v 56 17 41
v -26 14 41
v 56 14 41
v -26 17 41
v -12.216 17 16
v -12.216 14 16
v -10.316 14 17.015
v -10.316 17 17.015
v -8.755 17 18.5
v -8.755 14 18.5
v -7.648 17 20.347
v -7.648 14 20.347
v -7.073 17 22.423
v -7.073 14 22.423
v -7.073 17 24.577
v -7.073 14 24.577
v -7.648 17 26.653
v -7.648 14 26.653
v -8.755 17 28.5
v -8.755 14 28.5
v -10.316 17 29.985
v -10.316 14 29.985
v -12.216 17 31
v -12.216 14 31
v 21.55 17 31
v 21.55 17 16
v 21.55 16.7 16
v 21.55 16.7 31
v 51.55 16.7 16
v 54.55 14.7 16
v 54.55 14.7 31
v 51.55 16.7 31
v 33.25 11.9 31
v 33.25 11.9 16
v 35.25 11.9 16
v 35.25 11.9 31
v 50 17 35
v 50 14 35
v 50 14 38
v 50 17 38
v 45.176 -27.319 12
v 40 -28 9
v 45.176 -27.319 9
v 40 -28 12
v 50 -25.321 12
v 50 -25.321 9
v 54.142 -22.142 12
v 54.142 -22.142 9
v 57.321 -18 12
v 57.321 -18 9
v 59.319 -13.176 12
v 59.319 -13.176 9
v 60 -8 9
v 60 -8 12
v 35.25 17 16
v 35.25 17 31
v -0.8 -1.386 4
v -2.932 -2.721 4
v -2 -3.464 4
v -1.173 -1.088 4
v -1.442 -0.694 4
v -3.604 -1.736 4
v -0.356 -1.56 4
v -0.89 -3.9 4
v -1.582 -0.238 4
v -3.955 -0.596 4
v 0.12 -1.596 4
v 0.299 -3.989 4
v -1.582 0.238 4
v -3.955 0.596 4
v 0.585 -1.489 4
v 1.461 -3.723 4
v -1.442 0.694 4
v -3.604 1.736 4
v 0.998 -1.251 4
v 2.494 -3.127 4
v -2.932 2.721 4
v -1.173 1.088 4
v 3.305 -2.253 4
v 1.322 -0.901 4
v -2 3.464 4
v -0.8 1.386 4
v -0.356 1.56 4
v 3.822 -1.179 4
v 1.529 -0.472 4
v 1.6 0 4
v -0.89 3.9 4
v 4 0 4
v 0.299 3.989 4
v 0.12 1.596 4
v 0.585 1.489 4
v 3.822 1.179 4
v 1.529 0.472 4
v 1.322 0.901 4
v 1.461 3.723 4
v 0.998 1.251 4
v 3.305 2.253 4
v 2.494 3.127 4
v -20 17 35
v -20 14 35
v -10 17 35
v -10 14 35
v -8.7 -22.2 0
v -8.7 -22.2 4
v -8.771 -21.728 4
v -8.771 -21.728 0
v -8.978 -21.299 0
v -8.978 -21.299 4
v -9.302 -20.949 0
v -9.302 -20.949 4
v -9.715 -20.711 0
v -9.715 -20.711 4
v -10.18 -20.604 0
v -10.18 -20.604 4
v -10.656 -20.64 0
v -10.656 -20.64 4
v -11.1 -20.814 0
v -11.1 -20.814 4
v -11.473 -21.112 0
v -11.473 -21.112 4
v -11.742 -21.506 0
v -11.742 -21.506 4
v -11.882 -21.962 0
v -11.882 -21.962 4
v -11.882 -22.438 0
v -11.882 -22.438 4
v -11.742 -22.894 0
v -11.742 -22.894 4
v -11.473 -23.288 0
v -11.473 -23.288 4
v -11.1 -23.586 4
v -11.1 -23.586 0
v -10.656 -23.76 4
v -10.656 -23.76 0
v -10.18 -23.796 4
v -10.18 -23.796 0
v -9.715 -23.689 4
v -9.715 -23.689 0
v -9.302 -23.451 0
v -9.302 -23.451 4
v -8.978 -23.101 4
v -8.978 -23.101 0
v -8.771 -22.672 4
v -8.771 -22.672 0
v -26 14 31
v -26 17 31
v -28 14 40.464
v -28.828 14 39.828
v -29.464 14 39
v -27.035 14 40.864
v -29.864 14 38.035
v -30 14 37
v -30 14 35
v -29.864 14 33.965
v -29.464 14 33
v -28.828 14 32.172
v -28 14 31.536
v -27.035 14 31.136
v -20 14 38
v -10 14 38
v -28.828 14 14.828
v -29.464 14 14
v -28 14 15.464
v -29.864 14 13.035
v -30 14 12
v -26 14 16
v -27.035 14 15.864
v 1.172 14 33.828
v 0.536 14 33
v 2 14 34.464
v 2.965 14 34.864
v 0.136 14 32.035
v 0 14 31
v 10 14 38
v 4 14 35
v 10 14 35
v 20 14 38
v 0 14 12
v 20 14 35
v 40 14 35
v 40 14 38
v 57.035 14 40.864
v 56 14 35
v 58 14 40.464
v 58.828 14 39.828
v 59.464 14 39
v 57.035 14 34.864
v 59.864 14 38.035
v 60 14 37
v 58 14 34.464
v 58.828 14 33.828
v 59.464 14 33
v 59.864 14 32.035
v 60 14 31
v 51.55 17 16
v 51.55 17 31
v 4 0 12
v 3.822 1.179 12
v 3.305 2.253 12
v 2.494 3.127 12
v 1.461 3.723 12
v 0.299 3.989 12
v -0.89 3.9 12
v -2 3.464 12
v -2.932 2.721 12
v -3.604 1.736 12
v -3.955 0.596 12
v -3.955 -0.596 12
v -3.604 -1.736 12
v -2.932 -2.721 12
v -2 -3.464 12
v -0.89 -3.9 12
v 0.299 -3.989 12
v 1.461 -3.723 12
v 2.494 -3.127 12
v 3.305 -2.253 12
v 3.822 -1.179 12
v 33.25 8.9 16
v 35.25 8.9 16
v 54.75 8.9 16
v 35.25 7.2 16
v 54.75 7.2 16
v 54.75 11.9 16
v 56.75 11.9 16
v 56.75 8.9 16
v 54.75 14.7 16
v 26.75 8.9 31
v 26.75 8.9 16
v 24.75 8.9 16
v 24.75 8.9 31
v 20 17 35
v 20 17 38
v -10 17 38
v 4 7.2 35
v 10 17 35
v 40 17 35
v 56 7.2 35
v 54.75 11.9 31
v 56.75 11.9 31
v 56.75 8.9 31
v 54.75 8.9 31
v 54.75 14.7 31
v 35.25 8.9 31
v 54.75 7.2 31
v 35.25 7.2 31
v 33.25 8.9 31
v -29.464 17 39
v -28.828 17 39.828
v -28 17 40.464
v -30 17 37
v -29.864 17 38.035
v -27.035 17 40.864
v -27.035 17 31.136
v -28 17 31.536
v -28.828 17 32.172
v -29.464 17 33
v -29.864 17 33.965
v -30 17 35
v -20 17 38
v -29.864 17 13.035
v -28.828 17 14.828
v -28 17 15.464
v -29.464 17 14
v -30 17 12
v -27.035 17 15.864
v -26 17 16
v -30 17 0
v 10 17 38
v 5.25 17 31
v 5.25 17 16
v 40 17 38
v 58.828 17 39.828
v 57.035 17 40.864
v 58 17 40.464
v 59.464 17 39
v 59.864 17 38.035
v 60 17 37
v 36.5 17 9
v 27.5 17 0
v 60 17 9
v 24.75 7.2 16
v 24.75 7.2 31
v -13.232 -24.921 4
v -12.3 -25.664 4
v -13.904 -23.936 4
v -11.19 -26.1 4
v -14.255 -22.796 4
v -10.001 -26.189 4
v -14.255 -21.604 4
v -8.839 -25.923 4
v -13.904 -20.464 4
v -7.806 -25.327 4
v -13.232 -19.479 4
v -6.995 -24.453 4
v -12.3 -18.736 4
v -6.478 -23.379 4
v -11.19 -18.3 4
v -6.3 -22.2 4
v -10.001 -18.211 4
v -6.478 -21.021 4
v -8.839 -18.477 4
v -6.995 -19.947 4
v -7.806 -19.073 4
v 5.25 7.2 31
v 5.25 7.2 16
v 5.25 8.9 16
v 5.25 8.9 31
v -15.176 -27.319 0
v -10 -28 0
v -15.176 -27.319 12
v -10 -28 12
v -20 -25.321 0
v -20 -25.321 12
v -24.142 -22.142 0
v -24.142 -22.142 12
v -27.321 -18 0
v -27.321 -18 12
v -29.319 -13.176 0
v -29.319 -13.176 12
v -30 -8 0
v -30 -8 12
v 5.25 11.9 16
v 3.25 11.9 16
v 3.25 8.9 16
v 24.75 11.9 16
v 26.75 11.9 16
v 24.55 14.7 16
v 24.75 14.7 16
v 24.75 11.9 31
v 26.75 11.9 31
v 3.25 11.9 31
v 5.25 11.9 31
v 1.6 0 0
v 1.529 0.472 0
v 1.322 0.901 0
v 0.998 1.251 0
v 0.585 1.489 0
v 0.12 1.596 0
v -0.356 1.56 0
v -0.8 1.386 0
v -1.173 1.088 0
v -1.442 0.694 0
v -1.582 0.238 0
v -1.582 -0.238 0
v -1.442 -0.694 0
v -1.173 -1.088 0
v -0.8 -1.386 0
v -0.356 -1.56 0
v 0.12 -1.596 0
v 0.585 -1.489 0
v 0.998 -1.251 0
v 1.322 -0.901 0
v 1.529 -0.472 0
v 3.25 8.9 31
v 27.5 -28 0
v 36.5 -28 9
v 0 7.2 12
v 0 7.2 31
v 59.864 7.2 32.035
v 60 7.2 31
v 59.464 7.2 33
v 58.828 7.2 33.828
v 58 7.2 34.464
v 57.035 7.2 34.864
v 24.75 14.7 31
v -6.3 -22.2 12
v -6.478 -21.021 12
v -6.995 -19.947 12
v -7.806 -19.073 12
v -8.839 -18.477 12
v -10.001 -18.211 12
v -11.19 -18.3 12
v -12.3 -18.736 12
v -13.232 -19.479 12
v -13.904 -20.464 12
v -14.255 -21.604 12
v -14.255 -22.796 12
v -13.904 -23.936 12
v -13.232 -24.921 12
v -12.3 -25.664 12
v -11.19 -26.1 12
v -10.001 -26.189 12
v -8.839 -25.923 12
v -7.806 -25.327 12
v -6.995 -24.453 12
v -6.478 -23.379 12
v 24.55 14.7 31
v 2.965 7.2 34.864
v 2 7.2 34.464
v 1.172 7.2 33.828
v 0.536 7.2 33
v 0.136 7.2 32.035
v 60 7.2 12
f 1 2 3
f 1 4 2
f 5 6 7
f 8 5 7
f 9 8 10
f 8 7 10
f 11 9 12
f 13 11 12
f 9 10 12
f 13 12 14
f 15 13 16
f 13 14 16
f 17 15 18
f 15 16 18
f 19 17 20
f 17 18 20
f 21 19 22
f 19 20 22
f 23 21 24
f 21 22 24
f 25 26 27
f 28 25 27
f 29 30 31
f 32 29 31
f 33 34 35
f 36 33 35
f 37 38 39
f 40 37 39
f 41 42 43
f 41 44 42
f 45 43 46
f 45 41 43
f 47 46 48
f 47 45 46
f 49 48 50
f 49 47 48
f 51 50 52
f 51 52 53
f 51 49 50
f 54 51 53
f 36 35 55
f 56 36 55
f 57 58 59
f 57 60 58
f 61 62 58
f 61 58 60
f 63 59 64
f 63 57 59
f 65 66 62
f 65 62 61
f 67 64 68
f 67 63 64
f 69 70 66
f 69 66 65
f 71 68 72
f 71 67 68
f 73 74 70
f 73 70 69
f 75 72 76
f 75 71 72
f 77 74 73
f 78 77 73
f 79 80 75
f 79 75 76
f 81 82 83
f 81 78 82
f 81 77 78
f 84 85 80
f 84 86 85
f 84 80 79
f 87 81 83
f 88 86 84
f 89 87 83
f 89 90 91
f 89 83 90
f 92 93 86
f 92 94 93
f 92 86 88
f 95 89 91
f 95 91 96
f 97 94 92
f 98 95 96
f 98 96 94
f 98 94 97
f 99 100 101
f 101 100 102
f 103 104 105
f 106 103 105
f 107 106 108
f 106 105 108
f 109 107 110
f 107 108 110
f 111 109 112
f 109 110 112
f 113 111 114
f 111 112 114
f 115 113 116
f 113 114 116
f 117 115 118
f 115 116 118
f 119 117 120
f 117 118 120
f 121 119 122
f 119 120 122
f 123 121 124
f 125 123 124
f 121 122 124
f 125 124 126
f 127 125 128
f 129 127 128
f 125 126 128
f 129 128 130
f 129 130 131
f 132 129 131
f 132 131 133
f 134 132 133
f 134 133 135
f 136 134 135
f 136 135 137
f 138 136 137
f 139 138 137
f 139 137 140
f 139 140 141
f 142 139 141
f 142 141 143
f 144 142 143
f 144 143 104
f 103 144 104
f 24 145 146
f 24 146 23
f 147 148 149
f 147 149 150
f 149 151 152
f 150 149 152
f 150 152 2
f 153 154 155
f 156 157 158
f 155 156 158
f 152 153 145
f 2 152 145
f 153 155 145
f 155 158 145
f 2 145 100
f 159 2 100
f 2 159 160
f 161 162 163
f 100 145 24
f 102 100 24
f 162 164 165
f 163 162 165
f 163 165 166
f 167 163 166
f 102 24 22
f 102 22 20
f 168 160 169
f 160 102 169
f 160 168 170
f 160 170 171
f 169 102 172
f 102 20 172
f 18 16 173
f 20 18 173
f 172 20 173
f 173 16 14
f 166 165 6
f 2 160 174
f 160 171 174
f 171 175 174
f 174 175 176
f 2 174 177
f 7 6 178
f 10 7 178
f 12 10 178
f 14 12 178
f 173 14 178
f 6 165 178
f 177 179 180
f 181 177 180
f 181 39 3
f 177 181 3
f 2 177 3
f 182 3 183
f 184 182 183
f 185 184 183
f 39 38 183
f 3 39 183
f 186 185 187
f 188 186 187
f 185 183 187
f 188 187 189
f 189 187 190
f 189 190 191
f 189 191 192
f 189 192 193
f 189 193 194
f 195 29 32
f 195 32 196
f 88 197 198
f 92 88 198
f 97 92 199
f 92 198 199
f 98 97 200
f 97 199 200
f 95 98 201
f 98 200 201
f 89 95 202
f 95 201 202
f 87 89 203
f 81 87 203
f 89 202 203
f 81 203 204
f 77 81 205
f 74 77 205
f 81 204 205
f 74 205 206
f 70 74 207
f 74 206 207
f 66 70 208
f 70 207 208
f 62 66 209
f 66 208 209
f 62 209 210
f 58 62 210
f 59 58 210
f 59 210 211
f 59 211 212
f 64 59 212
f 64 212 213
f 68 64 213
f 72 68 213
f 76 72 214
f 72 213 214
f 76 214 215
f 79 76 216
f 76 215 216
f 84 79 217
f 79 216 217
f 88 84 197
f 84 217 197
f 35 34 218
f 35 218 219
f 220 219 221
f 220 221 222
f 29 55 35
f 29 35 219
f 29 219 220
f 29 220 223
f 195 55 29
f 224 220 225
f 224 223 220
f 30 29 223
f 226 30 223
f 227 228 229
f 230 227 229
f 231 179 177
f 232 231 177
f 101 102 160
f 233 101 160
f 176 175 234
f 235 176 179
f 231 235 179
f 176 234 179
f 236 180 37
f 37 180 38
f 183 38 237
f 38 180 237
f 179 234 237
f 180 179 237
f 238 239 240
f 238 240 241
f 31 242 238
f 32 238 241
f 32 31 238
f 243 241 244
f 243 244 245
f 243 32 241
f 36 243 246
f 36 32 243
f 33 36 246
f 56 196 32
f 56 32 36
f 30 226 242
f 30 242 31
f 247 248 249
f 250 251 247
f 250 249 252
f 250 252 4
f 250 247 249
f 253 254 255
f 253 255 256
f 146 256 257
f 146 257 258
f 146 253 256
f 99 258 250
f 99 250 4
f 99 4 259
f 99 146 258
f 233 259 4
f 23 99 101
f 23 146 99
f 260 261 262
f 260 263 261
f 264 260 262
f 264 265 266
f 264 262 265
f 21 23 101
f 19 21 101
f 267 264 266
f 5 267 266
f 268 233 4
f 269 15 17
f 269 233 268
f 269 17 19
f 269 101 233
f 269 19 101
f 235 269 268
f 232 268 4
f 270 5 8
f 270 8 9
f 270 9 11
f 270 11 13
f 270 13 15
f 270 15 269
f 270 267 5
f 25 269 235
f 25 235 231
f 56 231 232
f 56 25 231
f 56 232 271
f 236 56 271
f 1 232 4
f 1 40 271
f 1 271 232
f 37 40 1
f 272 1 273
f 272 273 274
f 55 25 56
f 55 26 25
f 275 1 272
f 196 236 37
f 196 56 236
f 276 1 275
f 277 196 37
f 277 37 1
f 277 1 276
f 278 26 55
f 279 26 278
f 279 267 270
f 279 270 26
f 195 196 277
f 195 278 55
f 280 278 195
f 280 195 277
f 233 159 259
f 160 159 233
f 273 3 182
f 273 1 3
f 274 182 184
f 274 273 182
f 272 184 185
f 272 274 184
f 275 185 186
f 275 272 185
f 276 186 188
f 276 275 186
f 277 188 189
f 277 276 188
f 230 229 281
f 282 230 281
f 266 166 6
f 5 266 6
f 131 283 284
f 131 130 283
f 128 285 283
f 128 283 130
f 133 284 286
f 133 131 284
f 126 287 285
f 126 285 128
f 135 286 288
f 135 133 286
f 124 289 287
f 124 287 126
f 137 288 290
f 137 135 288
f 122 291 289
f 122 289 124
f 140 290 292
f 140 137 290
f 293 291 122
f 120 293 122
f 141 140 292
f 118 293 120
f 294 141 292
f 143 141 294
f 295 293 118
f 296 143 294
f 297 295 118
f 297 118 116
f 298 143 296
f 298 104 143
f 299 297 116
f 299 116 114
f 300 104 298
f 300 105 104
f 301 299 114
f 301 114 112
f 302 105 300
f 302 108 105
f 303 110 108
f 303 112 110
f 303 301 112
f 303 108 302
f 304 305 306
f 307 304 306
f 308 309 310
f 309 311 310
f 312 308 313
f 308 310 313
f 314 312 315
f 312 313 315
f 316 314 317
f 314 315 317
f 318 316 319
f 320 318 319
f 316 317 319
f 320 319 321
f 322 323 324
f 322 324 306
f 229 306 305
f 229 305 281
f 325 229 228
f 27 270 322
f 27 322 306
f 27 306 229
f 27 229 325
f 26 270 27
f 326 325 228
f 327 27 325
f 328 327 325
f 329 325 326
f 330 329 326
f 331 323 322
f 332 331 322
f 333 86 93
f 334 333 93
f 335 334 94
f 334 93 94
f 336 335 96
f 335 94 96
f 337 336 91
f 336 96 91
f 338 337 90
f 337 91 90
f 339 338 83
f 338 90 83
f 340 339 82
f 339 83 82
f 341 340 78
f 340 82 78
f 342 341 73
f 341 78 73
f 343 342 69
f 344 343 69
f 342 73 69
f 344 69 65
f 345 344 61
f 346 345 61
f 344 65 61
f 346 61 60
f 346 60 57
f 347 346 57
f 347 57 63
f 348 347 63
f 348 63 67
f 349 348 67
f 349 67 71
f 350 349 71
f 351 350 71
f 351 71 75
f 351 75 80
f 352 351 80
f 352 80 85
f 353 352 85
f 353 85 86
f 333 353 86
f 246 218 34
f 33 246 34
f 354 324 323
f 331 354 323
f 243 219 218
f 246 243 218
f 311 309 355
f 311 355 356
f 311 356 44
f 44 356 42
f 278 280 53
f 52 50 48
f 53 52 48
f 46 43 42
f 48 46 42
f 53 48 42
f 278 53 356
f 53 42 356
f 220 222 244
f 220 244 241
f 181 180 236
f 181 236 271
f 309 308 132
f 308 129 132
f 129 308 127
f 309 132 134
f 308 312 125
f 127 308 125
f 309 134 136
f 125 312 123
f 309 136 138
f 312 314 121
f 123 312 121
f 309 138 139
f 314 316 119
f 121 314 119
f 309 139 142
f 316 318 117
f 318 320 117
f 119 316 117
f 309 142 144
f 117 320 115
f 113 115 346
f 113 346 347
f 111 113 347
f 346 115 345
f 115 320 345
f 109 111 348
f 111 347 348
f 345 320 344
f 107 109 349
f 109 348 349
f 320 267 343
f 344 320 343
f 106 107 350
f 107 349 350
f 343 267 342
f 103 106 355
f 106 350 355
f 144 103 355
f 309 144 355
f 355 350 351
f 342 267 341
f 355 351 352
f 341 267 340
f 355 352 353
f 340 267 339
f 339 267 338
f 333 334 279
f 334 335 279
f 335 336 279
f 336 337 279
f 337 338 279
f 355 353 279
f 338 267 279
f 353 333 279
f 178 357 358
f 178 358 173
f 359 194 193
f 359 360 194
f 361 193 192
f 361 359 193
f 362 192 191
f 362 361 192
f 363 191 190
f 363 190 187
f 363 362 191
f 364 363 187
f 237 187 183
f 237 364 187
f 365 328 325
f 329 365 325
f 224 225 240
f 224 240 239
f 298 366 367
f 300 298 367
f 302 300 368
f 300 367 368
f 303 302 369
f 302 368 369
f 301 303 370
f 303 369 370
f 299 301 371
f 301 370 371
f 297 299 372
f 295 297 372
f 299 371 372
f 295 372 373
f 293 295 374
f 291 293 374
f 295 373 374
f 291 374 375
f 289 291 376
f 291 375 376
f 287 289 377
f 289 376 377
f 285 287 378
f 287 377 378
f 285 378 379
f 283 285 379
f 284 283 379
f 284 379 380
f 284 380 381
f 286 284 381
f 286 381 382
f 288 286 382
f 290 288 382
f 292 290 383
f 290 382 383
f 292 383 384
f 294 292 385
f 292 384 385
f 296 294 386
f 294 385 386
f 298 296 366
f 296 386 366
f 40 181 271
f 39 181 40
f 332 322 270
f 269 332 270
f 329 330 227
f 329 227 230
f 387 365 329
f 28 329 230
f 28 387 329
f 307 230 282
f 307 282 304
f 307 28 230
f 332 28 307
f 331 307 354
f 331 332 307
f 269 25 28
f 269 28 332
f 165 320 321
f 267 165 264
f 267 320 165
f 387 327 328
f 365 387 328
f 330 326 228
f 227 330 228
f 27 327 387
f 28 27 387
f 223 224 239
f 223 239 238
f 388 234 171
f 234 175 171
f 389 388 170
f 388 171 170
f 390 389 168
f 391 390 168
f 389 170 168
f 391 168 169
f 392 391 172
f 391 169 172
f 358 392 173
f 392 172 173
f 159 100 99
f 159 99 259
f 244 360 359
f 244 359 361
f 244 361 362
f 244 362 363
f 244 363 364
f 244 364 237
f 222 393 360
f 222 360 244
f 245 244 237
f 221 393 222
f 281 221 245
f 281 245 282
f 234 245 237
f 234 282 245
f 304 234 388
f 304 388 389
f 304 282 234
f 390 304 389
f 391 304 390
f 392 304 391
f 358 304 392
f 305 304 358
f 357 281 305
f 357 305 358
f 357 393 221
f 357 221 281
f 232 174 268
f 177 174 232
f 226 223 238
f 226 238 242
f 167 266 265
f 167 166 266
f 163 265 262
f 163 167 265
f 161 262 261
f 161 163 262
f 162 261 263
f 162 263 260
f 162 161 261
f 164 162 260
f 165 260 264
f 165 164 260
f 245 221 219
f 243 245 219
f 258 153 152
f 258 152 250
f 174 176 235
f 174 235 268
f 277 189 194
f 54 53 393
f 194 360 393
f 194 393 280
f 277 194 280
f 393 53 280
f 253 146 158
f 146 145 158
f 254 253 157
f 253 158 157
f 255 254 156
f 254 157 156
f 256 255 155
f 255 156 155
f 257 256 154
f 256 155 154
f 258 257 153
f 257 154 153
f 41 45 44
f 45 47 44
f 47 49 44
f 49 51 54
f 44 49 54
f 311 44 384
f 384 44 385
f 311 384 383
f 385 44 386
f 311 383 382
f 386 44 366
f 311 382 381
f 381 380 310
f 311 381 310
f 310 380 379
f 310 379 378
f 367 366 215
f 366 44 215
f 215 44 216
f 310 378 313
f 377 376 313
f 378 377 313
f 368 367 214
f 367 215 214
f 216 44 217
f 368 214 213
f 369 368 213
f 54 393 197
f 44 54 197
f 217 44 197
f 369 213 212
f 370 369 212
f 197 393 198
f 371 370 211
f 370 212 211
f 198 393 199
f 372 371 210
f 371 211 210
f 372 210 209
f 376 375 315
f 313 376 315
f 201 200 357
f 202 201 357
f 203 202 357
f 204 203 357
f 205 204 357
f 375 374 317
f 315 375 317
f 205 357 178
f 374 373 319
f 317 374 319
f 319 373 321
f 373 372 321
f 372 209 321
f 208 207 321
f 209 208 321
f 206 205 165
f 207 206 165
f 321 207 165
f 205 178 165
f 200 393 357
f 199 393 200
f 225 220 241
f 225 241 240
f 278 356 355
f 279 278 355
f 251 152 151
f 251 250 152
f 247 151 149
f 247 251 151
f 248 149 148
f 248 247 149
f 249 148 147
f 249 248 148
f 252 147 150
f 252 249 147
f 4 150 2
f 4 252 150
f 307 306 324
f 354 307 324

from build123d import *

# Parameters (mm, degrees)
SKETCH_W        = 90
SKETCH_H        = 45
PAD_DEPTH       = 16
POCKET_DEPTH    = 60
PAD001_DEPTH    = 15
POCKET001_DEPTH = 4
PAD002_DEPTH    = 4
POCKET002_DEPTH = 5
SKETCH006_W     = 90
SKETCH006_H     = 3
PAD003_DEPTH    = 6
SKETCH007_W     = 10
SKETCH007_H     = 3
POCKET003_DEPTH = 5
SKETCH008_R     = 1.6
POCKET004_DEPTH = 20
SKETCH009_R     = 4
POCKET005_DEPTH = 8
FILLET_R        = 4
FILLET001_R     = 4
FILLET002_R     = 20
SKETCH010_W     = 18.432236
SKETCH010_H     = 15
POCKET006_DEPTH = 5
FILLET003_R     = 4
CHAMFER_1_SIZE2 = 3
CHAMFER_1_SIZE  = 2
CHAMFER_2_SIZE2 = 3
CHAMFER_2_SIZE  = 2


with BuildPart() as part:
    # Sketch → Pad (new body)
    with BuildSketch(Plane.XY):
        with Locations((15, -5.5)):
            Rectangle(SKETCH_W, SKETCH_H)
    extrude(amount=PAD_DEPTH)

    # Sketch001 (on Face2 of Pad) → Pocket (cut)
    with BuildSketch(Plane.XZ.offset(28)):
        Polygon((60, 0), (60, 9), (36.5, 9), (27.5, 0), align=None)
    extrude(amount=-POCKET_DEPTH, mode=Mode.SUBTRACT)

    # Sketch002 (on Face5 of Pocket) → Pad001 (join)
    with BuildSketch(Plane.XY.offset(16)):
        Polygon((54.75, 7.2), (54.75, 8.9), (56.75, 8.9), (56.75, 11.9), (54.75, 11.9), (54.75, 14.7), (51.55, 14.7), (51.55, 17), (60, 17), (60, 7.2), align=None)
        Polygon((35.25, 7.2), (35.25, 8.9), (33.25, 8.9), (33.25, 11.9), (35.25, 11.9), (35.25, 17), (21.55, 17), (21.55, 14.7), (24.75, 14.7), (24.75, 11.9), (26.75, 11.9), (26.75, 8.9), (24.75, 8.9), (24.75, 7.2), align=None)
        Polygon((5.25, 7.2), (5.25, 8.9), (3.25, 8.9), (3.25, 11.9), (5.25, 11.9), (5.25, 17), (-30, 17), (-30, 14), (0, 14), (0, 7.2), align=None)
    extrude(amount=PAD001_DEPTH)

    # Sketch003 (on Face3 of Pad001) → Pocket001 (cut)
    with BuildSketch(Plane.XY.offset(16)):
        Polygon((-30, -28), (-30, 14), (0, 14), (0, 7.2), (60, 7.2), (60, -28), align=None)
    extrude(amount=-POCKET001_DEPTH, mode=Mode.SUBTRACT)

    # Sketch004 (on Face9 of Pocket001) → Pad002 (join)
    with BuildSketch(Plane.XY.offset(31)):
        Polygon((-30, 17), (60, 17), (60, 7.2), (0, 7.2), (0, 14), (-30, 14), align=None)
    extrude(amount=PAD002_DEPTH)

    # Sketch005 (on Face39 of Pad002) → Pocket002 (cut)
    with BuildSketch(Plane.XZ.offset(-14)):
        with BuildLine():
            ThreePointArc((-12.216118, 16), (-7, 23.5), (-12.216118, 31))
            Line((-12.216118, 31), (-17.783882, 31))
            ThreePointArc((-17.783882, 31), (-23, 23.5), (-17.783882, 16))
            Line((-17.783882, 16), (-12.216118, 16))
        make_face()
    extrude(amount=-POCKET002_DEPTH, mode=Mode.SUBTRACT)

    # Sketch006 (on Face9 of Pocket002) → Pad003 (join)
    with BuildSketch(Plane.XY.offset(35)):
        with Locations((15, 15.5)):
            Rectangle(SKETCH006_W, SKETCH006_H)
    extrude(amount=PAD003_DEPTH)

    # Sketch007 (on Face45 of Pad003) → Pocket003 (cut)
    with BuildSketch(Plane.XZ.offset(-14)):
        with Locations((-15, 36.5)):
            Rectangle(SKETCH007_W, SKETCH007_H)
        with Locations((15, 36.5)):
            Rectangle(SKETCH007_W, SKETCH007_H)
        with Locations((45, 36.5)):
            Rectangle(SKETCH007_W, SKETCH007_H)
    extrude(amount=-POCKET003_DEPTH, mode=Mode.SUBTRACT)

    # Sketch008 (on Face43 of Pocket003) → Pocket004 (cut)
    with BuildSketch(Plane.XY.offset(12)):
        Circle(SKETCH008_R)
        with Locations((-10.3, -22.2)):
            Circle(SKETCH008_R)
    extrude(amount=-POCKET004_DEPTH, mode=Mode.SUBTRACT)

    # Sketch009 (on Face44 of Pocket004) → Pocket005 (cut)
    with BuildSketch(Plane.XY.offset(12)):
        with Locations((-10.3, -22.2)):
            Circle(SKETCH009_R)
        Circle(SKETCH009_R)
    extrude(amount=-POCKET005_DEPTH, mode=Mode.SUBTRACT)

    # Fillet
    fillet_edges = [part.edges().sort_by_distance(p)[0] for p in [
        (-30, 15.5, 41),
        (60, 15.5, 41),
    ]]
    fillet(fillet_edges, radius=FILLET_R)

    # Fillet001
    fillet001_edges = [part.edges().sort_by_distance(p)[0] for p in [
        (60, 10.6, 35),
        (0, 10.6, 35),
    ]]
    fillet(fillet001_edges, radius=FILLET001_R)

    # Fillet002
    fillet002_edges = [part.edges().sort_by_distance(p)[0] for p in [
        (-30, -28, 6),
        (60, -28, 10.5),
    ]]
    fillet(fillet002_edges, radius=FILLET002_R)

    # Sketch010 (on Face8 of Fillet002) → Pocket006 (cut)
    with BuildSketch(Plane.XZ.offset(-14)):
        with Locations((-27, 23.5)):
            Rectangle(SKETCH010_W, SKETCH010_H)
    extrude(amount=-POCKET006_DEPTH, mode=Mode.SUBTRACT)

    # Fillet003
    fillet003_edges = [part.edges().sort_by_distance(p)[0] for p in [
        (-30, 15.5, 31),
        (-30, 15.5, 16),
    ]]
    fillet(fillet003_edges, radius=FILLET003_R)

    # Chamfer 1
    chamfer_1_edges = [part.edges().sort_by_distance(p)[0] for p in [
        (21.55, 14.7, 23.5),
    ]]
    chamfer_1_side = part.faces().sort_by_distance((21.55, 15.85, 23.5))[0]
    chamfer(chamfer_1_edges, length=CHAMFER_1_SIZE, length2=CHAMFER_1_SIZE2, reference=chamfer_1_side)

    # Chamfer 2
    chamfer_2_edges = [part.edges().sort_by_distance(p)[0] for p in [
        (51.55, 14.7, 23.5),
    ]]
    chamfer_2_side = part.faces().sort_by_distance((51.55, 15.85, 23.5))[0]
    chamfer(chamfer_2_edges, length=CHAMFER_2_SIZE, length2=CHAMFER_2_SIZE2, reference=chamfer_2_side)


solid = part.part
